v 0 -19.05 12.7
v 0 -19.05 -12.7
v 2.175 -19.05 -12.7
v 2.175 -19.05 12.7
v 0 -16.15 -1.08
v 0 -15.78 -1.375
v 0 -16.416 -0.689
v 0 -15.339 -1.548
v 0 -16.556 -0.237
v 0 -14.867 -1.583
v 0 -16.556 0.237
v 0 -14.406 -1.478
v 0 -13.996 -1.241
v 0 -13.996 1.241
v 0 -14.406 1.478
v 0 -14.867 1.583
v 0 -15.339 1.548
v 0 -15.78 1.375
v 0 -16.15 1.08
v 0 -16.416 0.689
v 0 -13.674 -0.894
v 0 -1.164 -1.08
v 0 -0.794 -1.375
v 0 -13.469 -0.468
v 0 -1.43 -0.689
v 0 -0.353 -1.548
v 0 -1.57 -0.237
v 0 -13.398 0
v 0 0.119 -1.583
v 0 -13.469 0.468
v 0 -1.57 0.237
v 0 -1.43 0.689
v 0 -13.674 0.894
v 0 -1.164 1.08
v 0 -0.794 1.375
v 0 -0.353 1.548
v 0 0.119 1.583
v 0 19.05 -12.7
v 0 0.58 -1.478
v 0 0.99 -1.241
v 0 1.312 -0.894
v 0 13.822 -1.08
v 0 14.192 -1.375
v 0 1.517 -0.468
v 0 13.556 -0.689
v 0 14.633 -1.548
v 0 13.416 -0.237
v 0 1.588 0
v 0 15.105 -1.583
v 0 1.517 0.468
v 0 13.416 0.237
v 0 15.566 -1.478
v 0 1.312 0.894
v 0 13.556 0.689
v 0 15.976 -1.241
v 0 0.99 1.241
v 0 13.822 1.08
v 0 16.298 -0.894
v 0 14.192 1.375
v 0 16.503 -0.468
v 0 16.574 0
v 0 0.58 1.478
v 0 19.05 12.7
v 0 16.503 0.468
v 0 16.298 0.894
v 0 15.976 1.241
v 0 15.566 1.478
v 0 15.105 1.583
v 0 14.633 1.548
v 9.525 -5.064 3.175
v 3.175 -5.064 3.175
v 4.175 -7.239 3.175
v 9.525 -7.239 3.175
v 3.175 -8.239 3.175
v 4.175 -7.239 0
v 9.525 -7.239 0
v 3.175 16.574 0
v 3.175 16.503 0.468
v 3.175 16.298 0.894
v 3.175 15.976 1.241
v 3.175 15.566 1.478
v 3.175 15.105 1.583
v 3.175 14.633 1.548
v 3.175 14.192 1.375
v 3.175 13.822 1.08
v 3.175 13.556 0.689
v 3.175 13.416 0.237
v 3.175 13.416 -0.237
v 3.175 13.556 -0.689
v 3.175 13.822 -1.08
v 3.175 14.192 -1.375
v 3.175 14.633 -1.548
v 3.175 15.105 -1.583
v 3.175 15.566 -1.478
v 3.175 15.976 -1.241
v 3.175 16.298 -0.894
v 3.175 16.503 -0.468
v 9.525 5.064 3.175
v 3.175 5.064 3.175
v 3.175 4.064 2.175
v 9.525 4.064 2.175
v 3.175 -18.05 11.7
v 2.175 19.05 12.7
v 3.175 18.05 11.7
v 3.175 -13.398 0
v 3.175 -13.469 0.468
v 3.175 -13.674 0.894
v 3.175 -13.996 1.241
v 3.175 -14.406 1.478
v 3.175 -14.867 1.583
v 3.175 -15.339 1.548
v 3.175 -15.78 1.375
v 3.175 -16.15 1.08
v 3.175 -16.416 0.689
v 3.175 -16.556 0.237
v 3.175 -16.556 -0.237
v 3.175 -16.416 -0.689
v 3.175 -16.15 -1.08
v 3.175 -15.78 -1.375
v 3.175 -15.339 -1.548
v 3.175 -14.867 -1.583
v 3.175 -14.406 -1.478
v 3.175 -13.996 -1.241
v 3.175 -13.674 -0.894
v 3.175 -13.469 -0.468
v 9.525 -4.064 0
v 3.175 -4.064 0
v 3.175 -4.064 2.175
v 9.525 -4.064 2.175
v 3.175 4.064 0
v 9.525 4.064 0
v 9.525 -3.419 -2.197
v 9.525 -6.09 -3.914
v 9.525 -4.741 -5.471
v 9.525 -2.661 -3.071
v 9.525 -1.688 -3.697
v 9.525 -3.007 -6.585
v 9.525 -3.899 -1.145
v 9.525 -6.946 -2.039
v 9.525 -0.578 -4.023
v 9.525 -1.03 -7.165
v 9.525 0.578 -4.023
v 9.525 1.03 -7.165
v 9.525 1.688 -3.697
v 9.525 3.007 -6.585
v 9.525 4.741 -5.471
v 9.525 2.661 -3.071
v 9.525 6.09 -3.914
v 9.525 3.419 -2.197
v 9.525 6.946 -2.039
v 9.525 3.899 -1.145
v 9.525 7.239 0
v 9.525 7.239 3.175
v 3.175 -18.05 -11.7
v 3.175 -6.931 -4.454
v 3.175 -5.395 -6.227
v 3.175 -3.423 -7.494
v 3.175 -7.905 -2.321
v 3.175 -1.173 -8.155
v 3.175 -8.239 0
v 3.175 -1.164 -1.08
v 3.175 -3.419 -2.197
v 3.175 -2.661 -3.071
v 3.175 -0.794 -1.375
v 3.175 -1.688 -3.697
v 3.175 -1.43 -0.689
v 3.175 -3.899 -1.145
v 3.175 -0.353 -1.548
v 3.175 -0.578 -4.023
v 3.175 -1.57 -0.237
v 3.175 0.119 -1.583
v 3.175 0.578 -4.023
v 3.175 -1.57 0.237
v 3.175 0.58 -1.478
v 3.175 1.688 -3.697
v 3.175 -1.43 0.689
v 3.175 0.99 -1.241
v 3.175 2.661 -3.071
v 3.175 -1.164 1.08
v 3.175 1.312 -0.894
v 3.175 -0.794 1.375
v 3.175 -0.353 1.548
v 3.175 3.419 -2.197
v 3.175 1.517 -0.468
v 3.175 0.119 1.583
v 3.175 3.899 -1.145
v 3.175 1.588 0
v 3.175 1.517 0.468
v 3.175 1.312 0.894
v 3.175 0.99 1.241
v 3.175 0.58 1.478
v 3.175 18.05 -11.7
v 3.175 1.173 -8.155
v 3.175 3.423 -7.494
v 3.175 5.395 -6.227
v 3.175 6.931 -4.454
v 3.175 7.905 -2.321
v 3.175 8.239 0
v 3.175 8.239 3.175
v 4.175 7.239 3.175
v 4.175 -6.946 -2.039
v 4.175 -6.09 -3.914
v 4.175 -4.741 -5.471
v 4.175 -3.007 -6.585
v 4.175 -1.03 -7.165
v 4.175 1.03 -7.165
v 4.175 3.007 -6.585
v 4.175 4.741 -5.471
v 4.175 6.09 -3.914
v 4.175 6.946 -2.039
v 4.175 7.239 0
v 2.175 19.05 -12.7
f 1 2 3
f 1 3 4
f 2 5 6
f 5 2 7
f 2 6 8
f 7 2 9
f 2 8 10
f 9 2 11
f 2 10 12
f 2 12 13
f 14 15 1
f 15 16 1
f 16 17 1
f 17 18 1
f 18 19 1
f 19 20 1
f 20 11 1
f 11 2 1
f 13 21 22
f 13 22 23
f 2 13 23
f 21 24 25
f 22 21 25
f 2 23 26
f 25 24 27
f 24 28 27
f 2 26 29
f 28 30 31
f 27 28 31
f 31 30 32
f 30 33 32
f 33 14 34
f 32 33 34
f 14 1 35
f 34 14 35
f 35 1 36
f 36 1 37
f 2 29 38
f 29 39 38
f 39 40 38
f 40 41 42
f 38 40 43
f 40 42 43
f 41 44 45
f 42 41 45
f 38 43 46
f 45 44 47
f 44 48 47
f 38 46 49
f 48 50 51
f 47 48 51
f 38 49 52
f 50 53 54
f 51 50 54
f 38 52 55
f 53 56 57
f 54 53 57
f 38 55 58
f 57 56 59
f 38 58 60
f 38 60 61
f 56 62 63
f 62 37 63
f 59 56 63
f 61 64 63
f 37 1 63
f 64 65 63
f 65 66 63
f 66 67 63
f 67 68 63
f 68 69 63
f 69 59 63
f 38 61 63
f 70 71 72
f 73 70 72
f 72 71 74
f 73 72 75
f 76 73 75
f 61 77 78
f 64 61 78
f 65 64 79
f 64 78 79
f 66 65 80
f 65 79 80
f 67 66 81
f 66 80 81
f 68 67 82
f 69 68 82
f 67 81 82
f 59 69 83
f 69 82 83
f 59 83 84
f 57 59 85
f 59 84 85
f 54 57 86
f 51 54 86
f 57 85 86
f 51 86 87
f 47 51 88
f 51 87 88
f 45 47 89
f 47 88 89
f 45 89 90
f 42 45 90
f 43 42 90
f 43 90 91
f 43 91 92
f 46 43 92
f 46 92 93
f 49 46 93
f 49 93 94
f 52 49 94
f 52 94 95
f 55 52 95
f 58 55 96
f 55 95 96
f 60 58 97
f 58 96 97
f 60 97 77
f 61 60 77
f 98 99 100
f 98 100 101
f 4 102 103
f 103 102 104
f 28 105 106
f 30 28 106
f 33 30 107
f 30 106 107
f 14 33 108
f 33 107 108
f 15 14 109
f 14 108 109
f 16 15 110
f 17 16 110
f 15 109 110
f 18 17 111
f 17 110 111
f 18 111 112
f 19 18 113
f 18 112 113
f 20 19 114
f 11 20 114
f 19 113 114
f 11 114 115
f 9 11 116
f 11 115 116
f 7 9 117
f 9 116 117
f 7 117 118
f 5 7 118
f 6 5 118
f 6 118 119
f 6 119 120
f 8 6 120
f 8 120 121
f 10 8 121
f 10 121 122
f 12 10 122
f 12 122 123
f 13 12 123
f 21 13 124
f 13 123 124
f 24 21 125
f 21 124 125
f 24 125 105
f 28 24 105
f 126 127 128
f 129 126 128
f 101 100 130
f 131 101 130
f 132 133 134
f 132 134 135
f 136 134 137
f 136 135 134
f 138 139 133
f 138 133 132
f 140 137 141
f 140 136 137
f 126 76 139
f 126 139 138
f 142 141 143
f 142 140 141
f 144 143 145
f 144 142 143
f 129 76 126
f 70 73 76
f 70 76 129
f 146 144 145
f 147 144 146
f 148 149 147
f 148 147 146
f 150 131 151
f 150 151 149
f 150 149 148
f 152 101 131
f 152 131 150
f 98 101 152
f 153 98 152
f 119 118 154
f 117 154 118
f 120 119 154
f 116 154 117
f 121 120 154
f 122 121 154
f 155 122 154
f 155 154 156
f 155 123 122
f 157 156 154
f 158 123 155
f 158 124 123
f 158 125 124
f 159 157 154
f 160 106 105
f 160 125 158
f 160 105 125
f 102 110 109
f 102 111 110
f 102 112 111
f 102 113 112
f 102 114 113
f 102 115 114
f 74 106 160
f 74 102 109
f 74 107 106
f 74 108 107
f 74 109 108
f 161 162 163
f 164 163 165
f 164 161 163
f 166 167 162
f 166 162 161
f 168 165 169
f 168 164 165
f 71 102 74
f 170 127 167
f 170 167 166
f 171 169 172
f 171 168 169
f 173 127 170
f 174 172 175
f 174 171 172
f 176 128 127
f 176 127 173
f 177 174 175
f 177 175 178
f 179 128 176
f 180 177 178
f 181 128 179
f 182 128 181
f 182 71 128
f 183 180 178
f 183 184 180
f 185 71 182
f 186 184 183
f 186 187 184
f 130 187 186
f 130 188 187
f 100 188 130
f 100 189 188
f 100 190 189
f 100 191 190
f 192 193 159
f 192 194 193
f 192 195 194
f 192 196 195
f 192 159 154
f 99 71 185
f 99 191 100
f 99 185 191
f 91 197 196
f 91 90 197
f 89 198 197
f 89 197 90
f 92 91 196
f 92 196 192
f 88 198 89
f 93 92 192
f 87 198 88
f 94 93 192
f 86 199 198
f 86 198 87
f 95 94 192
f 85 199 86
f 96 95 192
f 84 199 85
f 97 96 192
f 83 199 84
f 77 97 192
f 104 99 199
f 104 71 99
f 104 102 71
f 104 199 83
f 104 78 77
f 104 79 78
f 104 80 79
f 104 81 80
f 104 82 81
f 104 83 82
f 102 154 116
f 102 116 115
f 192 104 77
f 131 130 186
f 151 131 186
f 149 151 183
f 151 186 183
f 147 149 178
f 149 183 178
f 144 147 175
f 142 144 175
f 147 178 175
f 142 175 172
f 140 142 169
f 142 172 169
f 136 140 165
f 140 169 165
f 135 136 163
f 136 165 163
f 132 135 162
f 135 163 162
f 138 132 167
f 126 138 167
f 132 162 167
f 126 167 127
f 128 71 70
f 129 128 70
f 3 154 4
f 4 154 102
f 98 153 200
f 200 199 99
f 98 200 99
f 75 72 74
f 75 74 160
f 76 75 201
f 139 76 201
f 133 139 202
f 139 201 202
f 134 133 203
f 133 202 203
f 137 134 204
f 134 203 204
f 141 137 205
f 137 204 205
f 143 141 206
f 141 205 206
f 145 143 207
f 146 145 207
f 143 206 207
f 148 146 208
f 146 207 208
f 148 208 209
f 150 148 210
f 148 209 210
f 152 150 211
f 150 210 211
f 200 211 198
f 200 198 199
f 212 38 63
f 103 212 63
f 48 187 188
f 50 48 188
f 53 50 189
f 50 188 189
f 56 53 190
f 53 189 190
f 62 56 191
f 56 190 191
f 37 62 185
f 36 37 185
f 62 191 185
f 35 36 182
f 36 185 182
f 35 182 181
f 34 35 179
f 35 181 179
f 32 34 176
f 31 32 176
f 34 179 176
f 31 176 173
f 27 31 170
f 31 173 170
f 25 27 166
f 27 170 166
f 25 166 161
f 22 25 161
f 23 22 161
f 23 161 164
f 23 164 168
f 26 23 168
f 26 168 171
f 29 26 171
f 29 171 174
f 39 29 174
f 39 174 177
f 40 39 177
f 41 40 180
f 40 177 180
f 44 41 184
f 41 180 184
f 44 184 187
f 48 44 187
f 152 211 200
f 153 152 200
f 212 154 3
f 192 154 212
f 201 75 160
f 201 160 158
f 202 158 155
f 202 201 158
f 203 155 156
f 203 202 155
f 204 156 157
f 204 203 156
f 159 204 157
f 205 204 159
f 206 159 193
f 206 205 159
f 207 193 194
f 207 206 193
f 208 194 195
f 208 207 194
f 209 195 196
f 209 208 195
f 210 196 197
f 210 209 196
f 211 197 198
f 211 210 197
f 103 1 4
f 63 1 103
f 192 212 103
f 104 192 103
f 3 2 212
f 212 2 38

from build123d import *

# Parameters (mm, degrees)
F0_W     = 38.1
F0_H     = 25.4
F1_DEPTH = 3.175
F3_DEPTH = 6.35
F4_R     = 1.5875
F5_DEPTH = 3.175
F6_SIZE  = 1


with BuildPart() as f1:
    # F0 (on Right) → F1 (new body)
    with BuildSketch(Plane.YZ):
        Rectangle(F0_W, F0_H)
    extrude(amount=F1_DEPTH)

    # F2 (on face) → F3 (join)
    with BuildSketch(Plane.YZ.offset(3.175)):
        with BuildLine():
            ThreePointArc((4.064, 0), (0, -4.064), (-4.064, 0))
            Line((-4.064, 0), (-4.064, 3.175))
            Line((-4.064, 3.175), (-7.239, 3.175))
            Line((-7.239, 3.175), (-7.239, 0))
            ThreePointArc((-7.239, 0), (0, -7.239), (7.239, 0))
            Line((7.239, 0), (7.239, 3.175))
            Line((7.239, 3.175), (4.064, 3.175))
            Line((4.064, 3.175), (4.064, 0))
        make_face()
    extrude(amount=F3_DEPTH)

    # F4 (on face) → F5 (cut, through all)
    with BuildSketch(Plane.YZ.offset(3.175)):
        with Locations((-14.986, 0)):
            Circle(F4_R)
        with Locations((14.986, 0)):
            Circle(F4_R)
        Circle(F4_R)
    extrude(amount=-F5_DEPTH, mode=Mode.SUBTRACT)

    # F6
    f6_edges = [f1.edges().sort_by_distance(p)[0] for p in [
        (6.35, -4.064, 3.175),
        (6.35, 4.064, 3.175),
        (3.175, -19.05, 0),
        (3.175, 0, 12.7),
        (3.175, 19.05, 0),
        (3.175, 0, -12.7),
        (3.175, 0, -7.239),
        (3.175, -7.239, 1.5875),
        (3.175, 7.239, 1.5875),
    ]]
    chamfer(f6_edges, length=F6_SIZE)


solid = f1.part
